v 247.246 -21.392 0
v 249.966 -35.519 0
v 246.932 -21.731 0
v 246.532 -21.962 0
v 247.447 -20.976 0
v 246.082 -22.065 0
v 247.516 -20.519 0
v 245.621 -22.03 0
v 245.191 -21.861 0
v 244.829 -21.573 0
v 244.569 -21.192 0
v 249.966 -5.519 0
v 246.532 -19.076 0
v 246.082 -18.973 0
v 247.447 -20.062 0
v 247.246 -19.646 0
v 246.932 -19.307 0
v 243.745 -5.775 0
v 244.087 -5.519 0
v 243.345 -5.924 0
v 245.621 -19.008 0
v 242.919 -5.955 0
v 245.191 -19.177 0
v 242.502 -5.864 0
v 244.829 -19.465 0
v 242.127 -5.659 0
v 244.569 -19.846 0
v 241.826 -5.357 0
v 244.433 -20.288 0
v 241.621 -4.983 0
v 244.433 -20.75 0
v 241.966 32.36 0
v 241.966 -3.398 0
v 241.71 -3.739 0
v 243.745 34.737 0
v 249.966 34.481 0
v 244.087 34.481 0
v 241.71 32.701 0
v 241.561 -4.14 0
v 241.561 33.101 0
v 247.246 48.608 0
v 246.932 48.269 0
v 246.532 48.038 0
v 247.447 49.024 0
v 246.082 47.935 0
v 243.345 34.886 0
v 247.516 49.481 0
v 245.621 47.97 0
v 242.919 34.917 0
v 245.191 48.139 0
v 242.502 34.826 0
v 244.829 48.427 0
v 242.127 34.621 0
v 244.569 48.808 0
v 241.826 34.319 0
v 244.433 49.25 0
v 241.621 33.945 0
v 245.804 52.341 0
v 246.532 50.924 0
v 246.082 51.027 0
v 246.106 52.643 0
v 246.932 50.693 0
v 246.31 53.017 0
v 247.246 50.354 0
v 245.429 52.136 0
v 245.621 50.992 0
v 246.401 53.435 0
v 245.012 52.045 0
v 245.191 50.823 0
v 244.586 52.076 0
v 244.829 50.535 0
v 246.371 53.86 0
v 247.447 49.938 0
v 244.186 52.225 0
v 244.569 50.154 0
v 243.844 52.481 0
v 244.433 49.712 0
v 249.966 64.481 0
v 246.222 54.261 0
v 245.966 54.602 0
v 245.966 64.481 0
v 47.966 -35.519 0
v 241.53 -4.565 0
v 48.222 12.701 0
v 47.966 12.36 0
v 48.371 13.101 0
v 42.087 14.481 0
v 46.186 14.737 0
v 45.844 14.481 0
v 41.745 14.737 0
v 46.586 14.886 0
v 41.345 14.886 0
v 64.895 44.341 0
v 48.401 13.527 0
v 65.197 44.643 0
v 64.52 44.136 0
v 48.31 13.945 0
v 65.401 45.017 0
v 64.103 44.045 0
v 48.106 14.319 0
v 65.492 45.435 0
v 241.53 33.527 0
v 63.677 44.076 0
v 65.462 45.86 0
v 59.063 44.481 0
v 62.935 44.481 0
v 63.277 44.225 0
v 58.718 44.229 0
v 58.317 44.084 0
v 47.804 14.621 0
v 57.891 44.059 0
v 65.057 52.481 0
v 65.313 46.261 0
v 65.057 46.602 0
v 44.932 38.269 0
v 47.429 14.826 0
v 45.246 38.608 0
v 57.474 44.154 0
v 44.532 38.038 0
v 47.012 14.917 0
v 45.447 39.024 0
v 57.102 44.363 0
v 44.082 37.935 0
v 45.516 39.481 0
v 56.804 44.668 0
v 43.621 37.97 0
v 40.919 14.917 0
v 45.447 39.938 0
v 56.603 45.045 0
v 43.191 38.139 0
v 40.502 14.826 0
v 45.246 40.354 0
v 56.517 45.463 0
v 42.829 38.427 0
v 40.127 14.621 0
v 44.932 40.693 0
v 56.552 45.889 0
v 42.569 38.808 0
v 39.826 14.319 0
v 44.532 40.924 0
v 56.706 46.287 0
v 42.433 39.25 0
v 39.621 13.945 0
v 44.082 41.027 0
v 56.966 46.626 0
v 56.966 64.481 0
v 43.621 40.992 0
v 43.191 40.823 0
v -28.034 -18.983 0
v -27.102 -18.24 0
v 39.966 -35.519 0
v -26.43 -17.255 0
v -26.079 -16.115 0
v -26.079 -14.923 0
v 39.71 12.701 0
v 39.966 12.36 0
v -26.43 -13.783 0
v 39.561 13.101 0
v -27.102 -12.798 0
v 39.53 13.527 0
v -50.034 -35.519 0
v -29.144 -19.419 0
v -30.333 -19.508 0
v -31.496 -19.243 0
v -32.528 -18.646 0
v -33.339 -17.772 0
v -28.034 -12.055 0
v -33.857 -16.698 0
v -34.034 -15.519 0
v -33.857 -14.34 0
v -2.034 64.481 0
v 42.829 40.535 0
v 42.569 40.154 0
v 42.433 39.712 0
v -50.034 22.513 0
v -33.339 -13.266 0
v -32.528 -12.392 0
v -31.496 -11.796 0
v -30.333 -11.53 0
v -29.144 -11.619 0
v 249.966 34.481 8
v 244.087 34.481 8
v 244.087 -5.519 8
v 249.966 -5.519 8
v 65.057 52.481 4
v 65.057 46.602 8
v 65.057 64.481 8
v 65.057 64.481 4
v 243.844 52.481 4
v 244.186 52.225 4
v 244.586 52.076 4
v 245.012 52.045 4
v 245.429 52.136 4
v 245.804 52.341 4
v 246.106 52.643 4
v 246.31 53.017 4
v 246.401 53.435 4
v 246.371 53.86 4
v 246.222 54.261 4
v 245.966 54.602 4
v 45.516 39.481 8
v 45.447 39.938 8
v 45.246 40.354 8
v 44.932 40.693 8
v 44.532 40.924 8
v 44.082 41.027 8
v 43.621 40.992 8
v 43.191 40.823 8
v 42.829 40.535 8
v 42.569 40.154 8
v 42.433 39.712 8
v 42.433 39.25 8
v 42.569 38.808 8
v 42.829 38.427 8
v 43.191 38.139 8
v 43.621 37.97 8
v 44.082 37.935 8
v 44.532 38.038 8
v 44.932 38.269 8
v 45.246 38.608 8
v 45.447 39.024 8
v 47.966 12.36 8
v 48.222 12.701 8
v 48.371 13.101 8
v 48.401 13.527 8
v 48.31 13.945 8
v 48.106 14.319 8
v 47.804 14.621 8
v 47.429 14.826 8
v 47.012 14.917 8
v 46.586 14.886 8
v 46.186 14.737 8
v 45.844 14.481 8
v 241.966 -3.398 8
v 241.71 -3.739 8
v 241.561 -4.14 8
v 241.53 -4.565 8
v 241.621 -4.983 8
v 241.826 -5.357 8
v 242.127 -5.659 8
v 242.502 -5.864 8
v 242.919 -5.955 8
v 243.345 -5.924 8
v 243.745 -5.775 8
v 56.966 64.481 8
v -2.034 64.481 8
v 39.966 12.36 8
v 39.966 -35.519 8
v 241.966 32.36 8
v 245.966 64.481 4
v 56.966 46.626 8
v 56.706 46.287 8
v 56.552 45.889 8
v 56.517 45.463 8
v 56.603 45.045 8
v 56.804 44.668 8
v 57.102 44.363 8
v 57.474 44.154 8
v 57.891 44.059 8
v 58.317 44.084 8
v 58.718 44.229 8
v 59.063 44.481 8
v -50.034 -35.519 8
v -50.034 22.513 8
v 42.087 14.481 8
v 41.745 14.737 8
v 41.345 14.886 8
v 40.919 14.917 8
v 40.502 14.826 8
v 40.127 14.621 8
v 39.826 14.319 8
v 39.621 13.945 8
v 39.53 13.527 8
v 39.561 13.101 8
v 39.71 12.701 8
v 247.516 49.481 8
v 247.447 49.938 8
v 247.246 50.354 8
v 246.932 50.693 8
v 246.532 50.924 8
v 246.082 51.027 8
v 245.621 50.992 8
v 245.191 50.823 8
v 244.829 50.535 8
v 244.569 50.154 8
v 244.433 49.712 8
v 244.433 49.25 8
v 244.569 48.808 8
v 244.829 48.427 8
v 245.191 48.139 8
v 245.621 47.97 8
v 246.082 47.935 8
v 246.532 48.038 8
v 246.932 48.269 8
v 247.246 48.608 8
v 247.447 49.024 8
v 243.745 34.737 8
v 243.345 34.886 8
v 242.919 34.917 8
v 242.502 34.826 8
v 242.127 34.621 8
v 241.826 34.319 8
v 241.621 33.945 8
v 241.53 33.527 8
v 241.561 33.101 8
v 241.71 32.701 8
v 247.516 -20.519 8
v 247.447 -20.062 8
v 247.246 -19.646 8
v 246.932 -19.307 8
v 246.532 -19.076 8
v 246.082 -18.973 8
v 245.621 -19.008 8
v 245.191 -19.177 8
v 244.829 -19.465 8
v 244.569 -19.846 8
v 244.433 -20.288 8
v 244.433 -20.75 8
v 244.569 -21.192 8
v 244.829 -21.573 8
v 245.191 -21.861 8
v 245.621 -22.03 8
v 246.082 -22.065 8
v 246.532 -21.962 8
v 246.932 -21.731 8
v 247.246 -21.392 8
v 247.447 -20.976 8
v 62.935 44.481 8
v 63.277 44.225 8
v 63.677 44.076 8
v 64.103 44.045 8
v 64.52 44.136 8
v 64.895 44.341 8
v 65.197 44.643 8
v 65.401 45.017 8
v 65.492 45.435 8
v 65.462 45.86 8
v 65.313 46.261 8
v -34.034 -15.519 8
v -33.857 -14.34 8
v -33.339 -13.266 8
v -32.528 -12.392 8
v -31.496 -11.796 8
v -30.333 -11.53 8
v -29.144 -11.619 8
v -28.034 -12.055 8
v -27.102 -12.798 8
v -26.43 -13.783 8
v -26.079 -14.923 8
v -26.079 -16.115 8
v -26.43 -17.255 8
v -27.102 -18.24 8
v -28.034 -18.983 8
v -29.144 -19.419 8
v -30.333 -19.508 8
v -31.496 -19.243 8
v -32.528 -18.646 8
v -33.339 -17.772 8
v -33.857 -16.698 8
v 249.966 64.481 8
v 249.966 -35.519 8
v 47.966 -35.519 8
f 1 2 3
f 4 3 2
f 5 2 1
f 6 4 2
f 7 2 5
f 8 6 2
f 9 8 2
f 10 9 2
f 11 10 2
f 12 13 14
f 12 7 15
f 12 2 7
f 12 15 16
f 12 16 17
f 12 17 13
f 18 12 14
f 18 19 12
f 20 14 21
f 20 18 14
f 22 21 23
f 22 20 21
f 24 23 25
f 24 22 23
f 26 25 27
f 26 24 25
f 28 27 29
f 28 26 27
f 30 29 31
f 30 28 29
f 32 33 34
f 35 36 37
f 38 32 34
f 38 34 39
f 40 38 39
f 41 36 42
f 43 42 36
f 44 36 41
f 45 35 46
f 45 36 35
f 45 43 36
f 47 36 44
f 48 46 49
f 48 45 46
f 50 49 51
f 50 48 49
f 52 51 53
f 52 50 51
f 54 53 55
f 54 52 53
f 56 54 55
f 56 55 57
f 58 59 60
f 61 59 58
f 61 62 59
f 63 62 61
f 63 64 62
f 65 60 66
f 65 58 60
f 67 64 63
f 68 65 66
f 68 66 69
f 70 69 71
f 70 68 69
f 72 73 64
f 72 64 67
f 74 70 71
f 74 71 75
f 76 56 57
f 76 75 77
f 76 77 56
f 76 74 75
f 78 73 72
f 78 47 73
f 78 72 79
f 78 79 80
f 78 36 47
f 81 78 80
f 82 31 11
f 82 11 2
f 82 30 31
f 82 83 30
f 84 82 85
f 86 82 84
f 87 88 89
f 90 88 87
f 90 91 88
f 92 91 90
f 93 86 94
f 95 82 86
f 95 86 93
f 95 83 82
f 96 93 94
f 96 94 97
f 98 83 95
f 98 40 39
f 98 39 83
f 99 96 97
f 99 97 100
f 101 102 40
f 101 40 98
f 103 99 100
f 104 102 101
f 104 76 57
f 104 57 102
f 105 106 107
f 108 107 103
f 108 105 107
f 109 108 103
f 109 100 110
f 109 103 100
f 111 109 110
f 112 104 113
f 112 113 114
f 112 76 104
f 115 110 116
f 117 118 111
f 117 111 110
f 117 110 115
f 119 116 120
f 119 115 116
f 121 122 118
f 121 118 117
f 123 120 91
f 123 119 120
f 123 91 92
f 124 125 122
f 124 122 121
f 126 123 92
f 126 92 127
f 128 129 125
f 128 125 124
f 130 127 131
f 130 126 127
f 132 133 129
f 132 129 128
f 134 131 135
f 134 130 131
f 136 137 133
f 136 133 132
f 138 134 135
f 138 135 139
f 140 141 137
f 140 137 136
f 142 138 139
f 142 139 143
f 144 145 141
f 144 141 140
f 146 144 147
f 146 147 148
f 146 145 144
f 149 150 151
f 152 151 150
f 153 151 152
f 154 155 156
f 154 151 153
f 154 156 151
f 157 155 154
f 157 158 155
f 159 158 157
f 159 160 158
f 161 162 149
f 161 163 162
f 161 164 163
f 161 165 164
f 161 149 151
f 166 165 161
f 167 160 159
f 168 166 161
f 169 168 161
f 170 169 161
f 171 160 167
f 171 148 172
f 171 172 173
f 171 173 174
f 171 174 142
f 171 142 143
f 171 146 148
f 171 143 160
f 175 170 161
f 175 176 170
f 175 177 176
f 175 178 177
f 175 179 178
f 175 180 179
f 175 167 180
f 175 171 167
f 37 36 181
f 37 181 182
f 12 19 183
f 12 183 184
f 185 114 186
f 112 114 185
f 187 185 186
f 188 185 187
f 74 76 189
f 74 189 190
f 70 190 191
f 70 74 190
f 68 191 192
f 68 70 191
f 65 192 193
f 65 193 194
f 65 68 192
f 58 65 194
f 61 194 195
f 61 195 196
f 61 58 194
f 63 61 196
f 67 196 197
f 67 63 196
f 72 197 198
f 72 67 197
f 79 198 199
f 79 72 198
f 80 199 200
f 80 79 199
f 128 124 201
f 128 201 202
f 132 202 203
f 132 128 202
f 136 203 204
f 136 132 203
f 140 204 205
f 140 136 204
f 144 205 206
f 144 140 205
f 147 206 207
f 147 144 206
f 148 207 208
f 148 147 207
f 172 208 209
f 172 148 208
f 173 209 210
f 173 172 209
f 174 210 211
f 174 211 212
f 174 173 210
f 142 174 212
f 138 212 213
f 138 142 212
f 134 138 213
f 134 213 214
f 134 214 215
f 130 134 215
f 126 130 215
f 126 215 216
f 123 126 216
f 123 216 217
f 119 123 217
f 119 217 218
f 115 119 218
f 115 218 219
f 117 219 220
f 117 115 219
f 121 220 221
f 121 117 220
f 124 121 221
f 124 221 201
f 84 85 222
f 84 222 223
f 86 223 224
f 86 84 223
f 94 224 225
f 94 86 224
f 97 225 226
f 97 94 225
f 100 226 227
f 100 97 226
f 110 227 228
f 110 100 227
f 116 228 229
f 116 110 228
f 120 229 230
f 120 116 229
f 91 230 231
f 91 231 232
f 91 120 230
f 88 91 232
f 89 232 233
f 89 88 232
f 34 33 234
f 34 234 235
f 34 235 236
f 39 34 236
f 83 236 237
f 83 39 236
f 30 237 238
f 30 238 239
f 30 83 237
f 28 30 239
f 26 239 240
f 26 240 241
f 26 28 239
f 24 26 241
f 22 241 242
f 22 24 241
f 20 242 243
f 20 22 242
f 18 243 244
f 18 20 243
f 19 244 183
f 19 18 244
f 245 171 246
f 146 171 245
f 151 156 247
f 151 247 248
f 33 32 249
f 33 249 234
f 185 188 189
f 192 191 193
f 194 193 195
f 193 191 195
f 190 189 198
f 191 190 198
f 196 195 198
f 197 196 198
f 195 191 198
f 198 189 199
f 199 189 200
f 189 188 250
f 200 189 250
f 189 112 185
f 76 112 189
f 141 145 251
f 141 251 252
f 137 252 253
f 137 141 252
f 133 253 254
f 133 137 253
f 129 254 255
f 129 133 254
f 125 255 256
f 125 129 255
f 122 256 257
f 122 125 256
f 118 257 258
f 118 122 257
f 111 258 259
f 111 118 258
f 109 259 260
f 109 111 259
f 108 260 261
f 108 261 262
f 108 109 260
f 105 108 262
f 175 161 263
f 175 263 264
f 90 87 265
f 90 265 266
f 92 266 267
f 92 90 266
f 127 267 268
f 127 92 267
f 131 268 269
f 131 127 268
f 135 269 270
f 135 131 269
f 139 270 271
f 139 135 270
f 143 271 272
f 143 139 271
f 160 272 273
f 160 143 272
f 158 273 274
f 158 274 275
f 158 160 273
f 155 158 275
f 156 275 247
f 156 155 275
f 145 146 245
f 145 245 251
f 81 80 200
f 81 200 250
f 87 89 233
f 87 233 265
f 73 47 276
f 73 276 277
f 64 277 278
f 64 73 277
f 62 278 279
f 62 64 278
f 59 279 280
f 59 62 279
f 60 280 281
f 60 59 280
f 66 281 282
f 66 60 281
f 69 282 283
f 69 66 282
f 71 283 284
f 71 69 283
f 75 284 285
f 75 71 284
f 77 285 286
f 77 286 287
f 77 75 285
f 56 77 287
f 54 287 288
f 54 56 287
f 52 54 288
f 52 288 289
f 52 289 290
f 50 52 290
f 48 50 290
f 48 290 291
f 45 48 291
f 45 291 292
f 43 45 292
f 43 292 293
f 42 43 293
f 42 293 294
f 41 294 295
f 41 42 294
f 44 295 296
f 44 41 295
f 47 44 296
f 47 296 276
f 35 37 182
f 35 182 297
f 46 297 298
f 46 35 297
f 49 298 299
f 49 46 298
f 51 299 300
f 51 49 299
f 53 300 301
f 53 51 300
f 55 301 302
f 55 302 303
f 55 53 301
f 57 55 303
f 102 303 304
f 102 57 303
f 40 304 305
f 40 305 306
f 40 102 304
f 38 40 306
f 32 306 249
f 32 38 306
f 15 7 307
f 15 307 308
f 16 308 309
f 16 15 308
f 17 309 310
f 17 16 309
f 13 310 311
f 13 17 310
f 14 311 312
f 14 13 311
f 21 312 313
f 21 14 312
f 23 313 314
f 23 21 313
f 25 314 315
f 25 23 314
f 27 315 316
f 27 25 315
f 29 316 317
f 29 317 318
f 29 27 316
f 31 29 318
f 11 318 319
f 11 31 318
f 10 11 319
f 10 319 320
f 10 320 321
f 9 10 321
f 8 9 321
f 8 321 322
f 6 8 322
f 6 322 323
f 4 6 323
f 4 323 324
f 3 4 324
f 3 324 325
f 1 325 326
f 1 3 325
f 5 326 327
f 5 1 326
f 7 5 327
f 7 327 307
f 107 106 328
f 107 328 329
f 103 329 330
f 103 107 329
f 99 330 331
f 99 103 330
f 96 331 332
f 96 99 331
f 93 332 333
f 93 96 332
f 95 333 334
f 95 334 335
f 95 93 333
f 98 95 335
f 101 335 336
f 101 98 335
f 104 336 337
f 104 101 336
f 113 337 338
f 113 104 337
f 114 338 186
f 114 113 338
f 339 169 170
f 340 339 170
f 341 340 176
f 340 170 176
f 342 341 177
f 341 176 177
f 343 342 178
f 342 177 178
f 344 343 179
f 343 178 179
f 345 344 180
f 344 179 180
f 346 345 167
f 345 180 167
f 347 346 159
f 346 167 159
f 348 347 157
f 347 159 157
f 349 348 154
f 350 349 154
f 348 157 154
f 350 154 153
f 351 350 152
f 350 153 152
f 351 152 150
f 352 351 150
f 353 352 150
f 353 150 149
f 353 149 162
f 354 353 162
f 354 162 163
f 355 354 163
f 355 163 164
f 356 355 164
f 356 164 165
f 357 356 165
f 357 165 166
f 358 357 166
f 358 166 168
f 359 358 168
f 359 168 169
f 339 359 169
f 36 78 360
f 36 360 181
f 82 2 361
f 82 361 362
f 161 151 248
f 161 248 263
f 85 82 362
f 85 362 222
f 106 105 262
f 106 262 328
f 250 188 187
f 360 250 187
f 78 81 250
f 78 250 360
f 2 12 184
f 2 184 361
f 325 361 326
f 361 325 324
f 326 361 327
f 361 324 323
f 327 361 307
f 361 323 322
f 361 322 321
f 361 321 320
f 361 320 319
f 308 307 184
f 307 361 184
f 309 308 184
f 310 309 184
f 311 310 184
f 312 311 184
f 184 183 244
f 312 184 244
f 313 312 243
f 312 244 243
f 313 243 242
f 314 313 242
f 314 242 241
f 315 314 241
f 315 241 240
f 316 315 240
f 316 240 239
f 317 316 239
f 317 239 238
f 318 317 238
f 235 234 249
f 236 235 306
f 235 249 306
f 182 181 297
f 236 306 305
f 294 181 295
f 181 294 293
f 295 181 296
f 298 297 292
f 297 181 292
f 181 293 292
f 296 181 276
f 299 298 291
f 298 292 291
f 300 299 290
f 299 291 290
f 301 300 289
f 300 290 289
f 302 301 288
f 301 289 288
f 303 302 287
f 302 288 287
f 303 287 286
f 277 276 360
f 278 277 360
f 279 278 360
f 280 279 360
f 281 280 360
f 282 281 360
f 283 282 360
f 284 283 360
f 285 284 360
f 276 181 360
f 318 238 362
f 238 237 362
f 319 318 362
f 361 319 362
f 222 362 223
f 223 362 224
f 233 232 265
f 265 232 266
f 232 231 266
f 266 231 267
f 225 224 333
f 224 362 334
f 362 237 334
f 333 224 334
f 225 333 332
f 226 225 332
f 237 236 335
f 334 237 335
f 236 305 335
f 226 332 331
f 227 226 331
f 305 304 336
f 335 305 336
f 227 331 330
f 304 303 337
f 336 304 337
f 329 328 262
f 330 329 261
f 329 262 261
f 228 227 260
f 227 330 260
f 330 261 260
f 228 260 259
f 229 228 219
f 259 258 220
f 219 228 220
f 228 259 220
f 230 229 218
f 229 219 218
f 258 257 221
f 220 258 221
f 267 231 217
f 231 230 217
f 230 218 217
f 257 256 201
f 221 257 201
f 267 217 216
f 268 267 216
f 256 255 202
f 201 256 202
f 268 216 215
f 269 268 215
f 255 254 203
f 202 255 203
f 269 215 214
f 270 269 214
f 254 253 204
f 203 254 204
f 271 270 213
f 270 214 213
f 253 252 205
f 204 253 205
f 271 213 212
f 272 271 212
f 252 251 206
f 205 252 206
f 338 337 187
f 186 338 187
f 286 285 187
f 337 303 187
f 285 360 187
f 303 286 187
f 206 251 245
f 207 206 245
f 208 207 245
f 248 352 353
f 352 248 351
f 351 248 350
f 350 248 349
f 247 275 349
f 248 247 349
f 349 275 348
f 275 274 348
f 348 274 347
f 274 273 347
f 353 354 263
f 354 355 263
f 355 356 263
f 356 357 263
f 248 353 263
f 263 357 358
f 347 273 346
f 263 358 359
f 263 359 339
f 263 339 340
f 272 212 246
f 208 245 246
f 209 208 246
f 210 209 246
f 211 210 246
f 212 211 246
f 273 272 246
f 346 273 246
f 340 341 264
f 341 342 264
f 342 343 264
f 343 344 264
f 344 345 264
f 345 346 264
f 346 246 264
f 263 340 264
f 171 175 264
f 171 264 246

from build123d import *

# Parameters (mm, degrees)
ESQUISSE1_R             = 1.55
BOSS_EXTRU_1_DEPTH      = 8
ENL_V_MAT_EXTRU_1_DEPTH = 4
ESQUISSE3_R             = 4
ENL_V_MAT_EXTRU_2_DEPTH = 38


with BuildPart() as part:
    # Esquisse1 → Boss.-Extru.1 (new body)
    with BuildSketch(Plane.XY):
        with BuildLine():
            Line((-2.034299831, 64.480985332), (56.965700169, 64.480985332))
            Line((56.965700169, 64.480985332), (56.965700169, 46.626034607))
            ThreePointArc((56.965700169, 46.626034607), (56.941837013, 44.504848488), (59.063023131, 44.480985332))
            Line((59.063023131, 44.480985332), (62.935403121, 44.480985332))
            ThreePointArc((62.935403121, 44.480985332), (65.056723464, 44.480985332), (65.056723464, 46.602305676))
            Line((65.056723464, 46.602305676), (65.056723464, 64.480985332))
            Line((65.056723464, 64.480985332), (249.965700169, 64.480985332))
            Line((249.965700169, 64.480985332), (249.965700169, 34.480985332))
            Line((249.965700169, 34.480985332), (244.087020512, 34.480985332))
            ThreePointArc((244.087020512, 34.480985332), (241.965700169, 34.480985332), (241.965700169, 32.359664989))
            Line((241.965700169, 32.359664989), (241.965700169, -3.397694324))
            ThreePointArc((241.965700169, -3.397694324), (241.965700169, -5.519014668), (244.087020512, -5.519014668))
            Line((244.087020512, -5.519014668), (249.965700169, -5.519014668))
            Line((249.965700169, -5.519014668), (249.965700169, -35.519014668))
            Line((249.965700169, -35.519014668), (47.965700169, -35.519014668))
            Line((47.965700169, -35.519014668), (47.965700169, 12.359664989))
            ThreePointArc((47.965700169, 12.359664989), (47.965700169, 14.480985332), (45.844379825, 14.480985332))
            Line((45.844379825, 14.480985332), (42.087020512, 14.480985332))
            ThreePointArc((42.087020512, 14.480985332), (39.965700169, 14.480985332), (39.965700169, 12.359664989))
            Line((39.965700169, 12.359664989), (39.965700169, -35.519014668))
            Line((39.965700169, -35.519014668), (-50.034299831, -35.519014668))
            Line((-50.034299831, -35.519014668), (-50.034299831, 22.512874652))
            Line((-50.034299831, 22.512874652), (-2.034299831, 64.480985332))
        make_face()
        with Locations((245.965700169, 49.480985332)):
            Circle(ESQUISSE1_R, mode=Mode.SUBTRACT)
        with Locations((245.965700169, -20.519014668)):
            Circle(ESQUISSE1_R, mode=Mode.SUBTRACT)
        with Locations((43.965700169, 39.480985332)):
            Circle(ESQUISSE1_R, mode=Mode.SUBTRACT)
    extrude(amount=BOSS_EXTRU_1_DEPTH)

    # Esquisse2 → Enlèv. mat.-Extru.1 (cut)
    with BuildSketch(Plane(origin=(0, 0, 0), x_dir=(-1, 0, 0), z_dir=(0, 0, -1))):
        with BuildLine():
            Line((-245.965700169, 64.480985332), (-60.965700169, 64.480985332))
            Line((-60.965700169, 64.480985332), (-60.965700169, 52.480985332))
            Line((-60.965700169, 52.480985332), (-243.844379825, 52.480985332))
            ThreePointArc((-243.844379825, 52.480985332), (-245.965700169, 52.480985332), (-245.965700169, 54.602305676))
            Line((-245.965700169, 54.602305676), (-245.965700169, 64.480985332))
        make_face()
    extrude(amount=-ENL_V_MAT_EXTRU_1_DEPTH, mode=Mode.SUBTRACT)

    # Esquisse3 → Enlèv. mat.-Extru.2 (cut)
    with BuildSketch(Plane(origin=(0, 0, 0), x_dir=(-1, 0, 0), z_dir=(0, 0, -1))):
        with Locations((30.034299831, -15.519014668)):
            Circle(ESQUISSE3_R)
    extrude(amount=-ENL_V_MAT_EXTRU_2_DEPTH, mode=Mode.SUBTRACT)


solid = part.part
